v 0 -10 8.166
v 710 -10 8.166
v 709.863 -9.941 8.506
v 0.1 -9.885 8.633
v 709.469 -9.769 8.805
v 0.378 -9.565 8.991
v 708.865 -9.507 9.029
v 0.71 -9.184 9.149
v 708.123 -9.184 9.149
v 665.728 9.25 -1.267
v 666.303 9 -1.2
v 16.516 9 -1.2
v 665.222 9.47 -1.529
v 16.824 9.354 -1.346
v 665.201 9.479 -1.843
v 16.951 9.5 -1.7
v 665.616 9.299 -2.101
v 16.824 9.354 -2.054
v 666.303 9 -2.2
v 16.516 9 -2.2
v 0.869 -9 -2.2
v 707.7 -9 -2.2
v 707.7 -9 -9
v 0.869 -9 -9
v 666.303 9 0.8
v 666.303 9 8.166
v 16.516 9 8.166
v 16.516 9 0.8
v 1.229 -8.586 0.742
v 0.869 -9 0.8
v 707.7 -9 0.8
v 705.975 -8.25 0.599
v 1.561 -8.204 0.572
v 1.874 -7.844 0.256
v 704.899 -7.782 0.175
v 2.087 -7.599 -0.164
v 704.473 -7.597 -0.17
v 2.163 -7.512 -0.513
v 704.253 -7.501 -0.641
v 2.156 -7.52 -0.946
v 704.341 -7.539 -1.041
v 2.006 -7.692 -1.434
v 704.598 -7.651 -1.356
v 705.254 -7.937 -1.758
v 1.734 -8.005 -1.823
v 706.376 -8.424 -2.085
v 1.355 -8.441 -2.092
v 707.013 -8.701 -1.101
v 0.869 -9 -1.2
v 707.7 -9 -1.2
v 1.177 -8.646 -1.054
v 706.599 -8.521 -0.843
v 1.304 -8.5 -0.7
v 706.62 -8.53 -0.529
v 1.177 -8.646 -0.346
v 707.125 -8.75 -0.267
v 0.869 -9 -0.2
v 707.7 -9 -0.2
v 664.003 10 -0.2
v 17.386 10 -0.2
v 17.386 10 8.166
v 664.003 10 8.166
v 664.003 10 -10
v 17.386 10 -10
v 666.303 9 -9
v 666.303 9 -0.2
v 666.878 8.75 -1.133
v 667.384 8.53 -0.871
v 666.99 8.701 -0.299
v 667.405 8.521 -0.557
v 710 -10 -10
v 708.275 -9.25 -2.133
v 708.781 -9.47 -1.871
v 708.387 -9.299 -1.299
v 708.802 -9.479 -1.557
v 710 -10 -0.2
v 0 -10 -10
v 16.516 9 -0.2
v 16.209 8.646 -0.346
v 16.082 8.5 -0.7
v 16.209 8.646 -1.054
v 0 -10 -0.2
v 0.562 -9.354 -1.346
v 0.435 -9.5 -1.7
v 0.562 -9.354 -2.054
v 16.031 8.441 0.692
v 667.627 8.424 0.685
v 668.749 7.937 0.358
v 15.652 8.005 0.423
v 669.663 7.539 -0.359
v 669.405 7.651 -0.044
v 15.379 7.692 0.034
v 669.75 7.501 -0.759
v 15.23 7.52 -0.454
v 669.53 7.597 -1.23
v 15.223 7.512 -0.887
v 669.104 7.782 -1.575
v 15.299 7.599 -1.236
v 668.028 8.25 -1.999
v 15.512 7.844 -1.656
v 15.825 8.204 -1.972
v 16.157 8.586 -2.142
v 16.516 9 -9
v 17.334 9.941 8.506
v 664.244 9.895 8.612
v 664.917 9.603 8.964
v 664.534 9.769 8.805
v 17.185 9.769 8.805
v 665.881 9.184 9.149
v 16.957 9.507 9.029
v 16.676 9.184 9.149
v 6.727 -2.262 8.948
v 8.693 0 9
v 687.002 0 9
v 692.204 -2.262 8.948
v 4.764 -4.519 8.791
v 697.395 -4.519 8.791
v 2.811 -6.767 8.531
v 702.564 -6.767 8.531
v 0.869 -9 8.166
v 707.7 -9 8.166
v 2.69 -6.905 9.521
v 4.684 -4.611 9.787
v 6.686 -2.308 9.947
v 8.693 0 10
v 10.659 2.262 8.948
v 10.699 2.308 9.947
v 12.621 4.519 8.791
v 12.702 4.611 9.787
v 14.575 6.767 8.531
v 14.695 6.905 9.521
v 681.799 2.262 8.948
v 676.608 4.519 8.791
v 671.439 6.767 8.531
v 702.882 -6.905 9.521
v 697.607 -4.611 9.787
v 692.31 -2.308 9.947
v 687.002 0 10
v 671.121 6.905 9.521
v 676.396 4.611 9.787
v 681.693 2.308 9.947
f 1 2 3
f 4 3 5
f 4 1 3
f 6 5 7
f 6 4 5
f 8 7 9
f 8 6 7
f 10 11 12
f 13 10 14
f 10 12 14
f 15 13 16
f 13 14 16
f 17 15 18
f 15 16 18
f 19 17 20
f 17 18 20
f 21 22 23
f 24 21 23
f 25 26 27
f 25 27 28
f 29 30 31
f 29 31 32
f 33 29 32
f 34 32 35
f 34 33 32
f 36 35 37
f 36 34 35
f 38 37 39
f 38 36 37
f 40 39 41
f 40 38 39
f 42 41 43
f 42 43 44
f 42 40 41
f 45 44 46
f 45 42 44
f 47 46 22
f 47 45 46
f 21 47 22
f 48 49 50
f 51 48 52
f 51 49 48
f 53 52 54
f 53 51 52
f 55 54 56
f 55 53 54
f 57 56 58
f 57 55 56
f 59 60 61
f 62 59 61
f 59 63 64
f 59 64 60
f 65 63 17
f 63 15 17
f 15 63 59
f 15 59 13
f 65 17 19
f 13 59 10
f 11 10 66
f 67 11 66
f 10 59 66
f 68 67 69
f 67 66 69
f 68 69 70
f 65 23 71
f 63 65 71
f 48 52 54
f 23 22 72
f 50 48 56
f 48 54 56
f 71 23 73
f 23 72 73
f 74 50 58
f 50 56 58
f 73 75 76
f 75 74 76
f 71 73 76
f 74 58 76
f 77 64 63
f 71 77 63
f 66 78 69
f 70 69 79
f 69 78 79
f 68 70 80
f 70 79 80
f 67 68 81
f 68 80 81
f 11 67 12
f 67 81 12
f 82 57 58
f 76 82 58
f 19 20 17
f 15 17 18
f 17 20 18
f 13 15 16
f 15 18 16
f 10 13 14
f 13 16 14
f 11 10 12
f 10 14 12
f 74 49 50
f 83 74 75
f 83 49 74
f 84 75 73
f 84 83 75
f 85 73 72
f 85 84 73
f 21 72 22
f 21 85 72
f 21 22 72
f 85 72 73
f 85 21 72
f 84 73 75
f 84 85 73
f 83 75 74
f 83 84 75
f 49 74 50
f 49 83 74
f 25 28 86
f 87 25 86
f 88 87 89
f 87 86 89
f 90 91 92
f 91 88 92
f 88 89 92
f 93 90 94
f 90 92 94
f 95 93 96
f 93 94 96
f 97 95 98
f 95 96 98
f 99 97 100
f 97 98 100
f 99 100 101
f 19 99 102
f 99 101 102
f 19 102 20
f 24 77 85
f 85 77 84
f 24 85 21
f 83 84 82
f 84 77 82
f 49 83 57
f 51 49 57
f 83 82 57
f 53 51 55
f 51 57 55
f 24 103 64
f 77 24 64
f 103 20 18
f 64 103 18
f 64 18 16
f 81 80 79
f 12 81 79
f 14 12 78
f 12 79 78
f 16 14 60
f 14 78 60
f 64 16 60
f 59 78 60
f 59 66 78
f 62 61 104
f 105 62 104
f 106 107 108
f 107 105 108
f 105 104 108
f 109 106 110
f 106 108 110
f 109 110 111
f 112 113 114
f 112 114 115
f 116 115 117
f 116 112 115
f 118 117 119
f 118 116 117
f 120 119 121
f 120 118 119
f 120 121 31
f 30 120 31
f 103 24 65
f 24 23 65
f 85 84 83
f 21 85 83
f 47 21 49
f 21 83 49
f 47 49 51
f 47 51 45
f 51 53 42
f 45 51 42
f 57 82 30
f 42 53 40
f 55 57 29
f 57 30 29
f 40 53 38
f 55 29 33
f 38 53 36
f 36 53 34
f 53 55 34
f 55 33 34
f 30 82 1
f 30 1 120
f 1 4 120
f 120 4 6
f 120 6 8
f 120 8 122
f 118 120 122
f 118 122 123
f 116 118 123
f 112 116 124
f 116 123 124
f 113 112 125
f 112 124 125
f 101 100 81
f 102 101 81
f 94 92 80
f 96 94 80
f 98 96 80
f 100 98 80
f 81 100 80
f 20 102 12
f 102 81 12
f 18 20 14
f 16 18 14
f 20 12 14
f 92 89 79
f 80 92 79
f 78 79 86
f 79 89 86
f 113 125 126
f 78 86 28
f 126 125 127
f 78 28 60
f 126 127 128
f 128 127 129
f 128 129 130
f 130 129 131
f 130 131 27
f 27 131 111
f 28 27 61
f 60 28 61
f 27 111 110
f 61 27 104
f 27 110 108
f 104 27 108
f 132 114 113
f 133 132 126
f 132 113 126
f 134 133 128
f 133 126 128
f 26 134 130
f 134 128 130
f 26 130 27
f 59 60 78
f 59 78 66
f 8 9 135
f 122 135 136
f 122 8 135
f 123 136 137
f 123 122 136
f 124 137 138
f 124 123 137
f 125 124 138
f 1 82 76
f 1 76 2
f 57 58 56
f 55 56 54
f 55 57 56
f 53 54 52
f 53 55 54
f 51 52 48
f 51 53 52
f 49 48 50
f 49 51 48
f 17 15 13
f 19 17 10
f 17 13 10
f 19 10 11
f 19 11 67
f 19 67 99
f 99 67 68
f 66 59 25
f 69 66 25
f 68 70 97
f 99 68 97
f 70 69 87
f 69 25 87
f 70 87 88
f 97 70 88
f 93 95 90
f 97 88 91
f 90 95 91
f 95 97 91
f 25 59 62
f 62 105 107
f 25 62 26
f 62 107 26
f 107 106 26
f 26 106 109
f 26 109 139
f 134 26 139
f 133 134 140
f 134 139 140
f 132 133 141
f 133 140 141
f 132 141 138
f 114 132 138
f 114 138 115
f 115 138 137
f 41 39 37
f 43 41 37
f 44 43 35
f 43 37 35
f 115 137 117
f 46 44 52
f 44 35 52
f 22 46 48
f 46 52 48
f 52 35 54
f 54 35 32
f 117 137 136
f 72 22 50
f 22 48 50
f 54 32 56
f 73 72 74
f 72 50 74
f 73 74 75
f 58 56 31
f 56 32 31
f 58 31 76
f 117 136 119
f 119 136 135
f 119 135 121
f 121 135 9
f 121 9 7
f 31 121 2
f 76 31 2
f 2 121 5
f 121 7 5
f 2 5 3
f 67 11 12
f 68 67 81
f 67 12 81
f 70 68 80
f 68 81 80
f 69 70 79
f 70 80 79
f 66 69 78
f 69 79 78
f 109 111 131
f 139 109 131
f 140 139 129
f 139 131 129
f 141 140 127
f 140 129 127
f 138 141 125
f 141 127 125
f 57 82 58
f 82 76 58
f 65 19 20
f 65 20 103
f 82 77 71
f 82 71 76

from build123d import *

# Parameters (mm, degrees)
F2_DEPTH      = 1000
F4_DEPTH      = 1000
F8_DEPTH      = 10.001
F8_DEPTH_BACK = 10.001


# Not quite as in the source:
# - ends of sketch curves that miss each other by under 0.0002 mm in the source are joined


with BuildPart() as f2:
    # F1 (on Right) → F2 (new body)
    with BuildSketch(Plane.YZ):
        with BuildLine():
            Line((0, -9), (0, -10))
            Line((0, -10), (10, -10))
            Line((10, -10), (10, -0.2))
            Line((10, -0.2), (9, -0.2))
            ThreePointArc((9, -0.2), (8.5, -0.7), (9, -1.2))
            ThreePointArc((9, -1.2), (9.5, -1.7), (9, -2.2))
            Line((9, -2.2), (9, -9))
            Line((9, -9), (0, -9))
        make_face()
    extrude(amount=F2_DEPTH)

    # F5: F2 across plane


with BuildPart() as f4:
    # F3 (on Right) → F4 (new body)
    with BuildSketch(Plane.YZ):
        with BuildLine():
            Line((9, -0.2), (10, -0.2))
            Line((10, -0.2), (10, 8.1663783152))
            ThreePointArc((10, 8.1663783152), (9.7693092582, 8.8052548802), (9.1836734694, 9.1493656277))
            ThreePointArc((9.1836734694, 9.1493656277), (4.6114920912, 9.7868872364), (0, 10))
            Line((0, 10), (0, 9))
            ThreePointArc((0, 9), (4.5192622493, 8.7911494917), (9, 8.1663783152))
            Line((9, 8.1663783152), (9, 0.8))
            ThreePointArc((9, 0.8), (7.5, -0.7), (9, -2.2))
            ThreePointArc((9, -2.2), (9.5, -1.7), (9, -1.2))
            ThreePointArc((9, -1.2), (8.5, -0.7), (9, -0.2))
        make_face()
    extrude(amount=F4_DEPTH)

    # F6: F4 across plane


with BuildPart() as f2_1:
    add(f2.part)
    add(f2.part.mirror(Plane.XZ))


with BuildPart() as f4_1:
    add(f4.part)
    add(f4.part.mirror(Plane.XZ))


with BuildPart() as f8_tool:
    # F7 (on Top) → F8 (new body, two sides)
    with BuildSketch(Plane.XY) as f8_sk:
        Polygon((0, 10), (0, 0), (0, -10), (17.3857347563, 10), align=None)
        Polygon((664.0031490553, 10), (710, -10), (1016.9613361359, -10), (1016.9613361359, 10), (709.9114895723, 10), align=None)
    extrude(amount=F8_DEPTH)
    extrude(f8_sk.sketch, amount=-F8_DEPTH_BACK)


with BuildPart() as f2_2:
    add(f2_1.part)

    # F8: cut by f8_tool
    add(f8_tool.part, mode=Mode.SUBTRACT)


with BuildPart() as f4_2:
    add(f4_1.part)

    # F8: cut by f8_tool
    add(f8_tool.part, mode=Mode.SUBTRACT)


solid = Compound([f2_2.part, f4_2.part])
